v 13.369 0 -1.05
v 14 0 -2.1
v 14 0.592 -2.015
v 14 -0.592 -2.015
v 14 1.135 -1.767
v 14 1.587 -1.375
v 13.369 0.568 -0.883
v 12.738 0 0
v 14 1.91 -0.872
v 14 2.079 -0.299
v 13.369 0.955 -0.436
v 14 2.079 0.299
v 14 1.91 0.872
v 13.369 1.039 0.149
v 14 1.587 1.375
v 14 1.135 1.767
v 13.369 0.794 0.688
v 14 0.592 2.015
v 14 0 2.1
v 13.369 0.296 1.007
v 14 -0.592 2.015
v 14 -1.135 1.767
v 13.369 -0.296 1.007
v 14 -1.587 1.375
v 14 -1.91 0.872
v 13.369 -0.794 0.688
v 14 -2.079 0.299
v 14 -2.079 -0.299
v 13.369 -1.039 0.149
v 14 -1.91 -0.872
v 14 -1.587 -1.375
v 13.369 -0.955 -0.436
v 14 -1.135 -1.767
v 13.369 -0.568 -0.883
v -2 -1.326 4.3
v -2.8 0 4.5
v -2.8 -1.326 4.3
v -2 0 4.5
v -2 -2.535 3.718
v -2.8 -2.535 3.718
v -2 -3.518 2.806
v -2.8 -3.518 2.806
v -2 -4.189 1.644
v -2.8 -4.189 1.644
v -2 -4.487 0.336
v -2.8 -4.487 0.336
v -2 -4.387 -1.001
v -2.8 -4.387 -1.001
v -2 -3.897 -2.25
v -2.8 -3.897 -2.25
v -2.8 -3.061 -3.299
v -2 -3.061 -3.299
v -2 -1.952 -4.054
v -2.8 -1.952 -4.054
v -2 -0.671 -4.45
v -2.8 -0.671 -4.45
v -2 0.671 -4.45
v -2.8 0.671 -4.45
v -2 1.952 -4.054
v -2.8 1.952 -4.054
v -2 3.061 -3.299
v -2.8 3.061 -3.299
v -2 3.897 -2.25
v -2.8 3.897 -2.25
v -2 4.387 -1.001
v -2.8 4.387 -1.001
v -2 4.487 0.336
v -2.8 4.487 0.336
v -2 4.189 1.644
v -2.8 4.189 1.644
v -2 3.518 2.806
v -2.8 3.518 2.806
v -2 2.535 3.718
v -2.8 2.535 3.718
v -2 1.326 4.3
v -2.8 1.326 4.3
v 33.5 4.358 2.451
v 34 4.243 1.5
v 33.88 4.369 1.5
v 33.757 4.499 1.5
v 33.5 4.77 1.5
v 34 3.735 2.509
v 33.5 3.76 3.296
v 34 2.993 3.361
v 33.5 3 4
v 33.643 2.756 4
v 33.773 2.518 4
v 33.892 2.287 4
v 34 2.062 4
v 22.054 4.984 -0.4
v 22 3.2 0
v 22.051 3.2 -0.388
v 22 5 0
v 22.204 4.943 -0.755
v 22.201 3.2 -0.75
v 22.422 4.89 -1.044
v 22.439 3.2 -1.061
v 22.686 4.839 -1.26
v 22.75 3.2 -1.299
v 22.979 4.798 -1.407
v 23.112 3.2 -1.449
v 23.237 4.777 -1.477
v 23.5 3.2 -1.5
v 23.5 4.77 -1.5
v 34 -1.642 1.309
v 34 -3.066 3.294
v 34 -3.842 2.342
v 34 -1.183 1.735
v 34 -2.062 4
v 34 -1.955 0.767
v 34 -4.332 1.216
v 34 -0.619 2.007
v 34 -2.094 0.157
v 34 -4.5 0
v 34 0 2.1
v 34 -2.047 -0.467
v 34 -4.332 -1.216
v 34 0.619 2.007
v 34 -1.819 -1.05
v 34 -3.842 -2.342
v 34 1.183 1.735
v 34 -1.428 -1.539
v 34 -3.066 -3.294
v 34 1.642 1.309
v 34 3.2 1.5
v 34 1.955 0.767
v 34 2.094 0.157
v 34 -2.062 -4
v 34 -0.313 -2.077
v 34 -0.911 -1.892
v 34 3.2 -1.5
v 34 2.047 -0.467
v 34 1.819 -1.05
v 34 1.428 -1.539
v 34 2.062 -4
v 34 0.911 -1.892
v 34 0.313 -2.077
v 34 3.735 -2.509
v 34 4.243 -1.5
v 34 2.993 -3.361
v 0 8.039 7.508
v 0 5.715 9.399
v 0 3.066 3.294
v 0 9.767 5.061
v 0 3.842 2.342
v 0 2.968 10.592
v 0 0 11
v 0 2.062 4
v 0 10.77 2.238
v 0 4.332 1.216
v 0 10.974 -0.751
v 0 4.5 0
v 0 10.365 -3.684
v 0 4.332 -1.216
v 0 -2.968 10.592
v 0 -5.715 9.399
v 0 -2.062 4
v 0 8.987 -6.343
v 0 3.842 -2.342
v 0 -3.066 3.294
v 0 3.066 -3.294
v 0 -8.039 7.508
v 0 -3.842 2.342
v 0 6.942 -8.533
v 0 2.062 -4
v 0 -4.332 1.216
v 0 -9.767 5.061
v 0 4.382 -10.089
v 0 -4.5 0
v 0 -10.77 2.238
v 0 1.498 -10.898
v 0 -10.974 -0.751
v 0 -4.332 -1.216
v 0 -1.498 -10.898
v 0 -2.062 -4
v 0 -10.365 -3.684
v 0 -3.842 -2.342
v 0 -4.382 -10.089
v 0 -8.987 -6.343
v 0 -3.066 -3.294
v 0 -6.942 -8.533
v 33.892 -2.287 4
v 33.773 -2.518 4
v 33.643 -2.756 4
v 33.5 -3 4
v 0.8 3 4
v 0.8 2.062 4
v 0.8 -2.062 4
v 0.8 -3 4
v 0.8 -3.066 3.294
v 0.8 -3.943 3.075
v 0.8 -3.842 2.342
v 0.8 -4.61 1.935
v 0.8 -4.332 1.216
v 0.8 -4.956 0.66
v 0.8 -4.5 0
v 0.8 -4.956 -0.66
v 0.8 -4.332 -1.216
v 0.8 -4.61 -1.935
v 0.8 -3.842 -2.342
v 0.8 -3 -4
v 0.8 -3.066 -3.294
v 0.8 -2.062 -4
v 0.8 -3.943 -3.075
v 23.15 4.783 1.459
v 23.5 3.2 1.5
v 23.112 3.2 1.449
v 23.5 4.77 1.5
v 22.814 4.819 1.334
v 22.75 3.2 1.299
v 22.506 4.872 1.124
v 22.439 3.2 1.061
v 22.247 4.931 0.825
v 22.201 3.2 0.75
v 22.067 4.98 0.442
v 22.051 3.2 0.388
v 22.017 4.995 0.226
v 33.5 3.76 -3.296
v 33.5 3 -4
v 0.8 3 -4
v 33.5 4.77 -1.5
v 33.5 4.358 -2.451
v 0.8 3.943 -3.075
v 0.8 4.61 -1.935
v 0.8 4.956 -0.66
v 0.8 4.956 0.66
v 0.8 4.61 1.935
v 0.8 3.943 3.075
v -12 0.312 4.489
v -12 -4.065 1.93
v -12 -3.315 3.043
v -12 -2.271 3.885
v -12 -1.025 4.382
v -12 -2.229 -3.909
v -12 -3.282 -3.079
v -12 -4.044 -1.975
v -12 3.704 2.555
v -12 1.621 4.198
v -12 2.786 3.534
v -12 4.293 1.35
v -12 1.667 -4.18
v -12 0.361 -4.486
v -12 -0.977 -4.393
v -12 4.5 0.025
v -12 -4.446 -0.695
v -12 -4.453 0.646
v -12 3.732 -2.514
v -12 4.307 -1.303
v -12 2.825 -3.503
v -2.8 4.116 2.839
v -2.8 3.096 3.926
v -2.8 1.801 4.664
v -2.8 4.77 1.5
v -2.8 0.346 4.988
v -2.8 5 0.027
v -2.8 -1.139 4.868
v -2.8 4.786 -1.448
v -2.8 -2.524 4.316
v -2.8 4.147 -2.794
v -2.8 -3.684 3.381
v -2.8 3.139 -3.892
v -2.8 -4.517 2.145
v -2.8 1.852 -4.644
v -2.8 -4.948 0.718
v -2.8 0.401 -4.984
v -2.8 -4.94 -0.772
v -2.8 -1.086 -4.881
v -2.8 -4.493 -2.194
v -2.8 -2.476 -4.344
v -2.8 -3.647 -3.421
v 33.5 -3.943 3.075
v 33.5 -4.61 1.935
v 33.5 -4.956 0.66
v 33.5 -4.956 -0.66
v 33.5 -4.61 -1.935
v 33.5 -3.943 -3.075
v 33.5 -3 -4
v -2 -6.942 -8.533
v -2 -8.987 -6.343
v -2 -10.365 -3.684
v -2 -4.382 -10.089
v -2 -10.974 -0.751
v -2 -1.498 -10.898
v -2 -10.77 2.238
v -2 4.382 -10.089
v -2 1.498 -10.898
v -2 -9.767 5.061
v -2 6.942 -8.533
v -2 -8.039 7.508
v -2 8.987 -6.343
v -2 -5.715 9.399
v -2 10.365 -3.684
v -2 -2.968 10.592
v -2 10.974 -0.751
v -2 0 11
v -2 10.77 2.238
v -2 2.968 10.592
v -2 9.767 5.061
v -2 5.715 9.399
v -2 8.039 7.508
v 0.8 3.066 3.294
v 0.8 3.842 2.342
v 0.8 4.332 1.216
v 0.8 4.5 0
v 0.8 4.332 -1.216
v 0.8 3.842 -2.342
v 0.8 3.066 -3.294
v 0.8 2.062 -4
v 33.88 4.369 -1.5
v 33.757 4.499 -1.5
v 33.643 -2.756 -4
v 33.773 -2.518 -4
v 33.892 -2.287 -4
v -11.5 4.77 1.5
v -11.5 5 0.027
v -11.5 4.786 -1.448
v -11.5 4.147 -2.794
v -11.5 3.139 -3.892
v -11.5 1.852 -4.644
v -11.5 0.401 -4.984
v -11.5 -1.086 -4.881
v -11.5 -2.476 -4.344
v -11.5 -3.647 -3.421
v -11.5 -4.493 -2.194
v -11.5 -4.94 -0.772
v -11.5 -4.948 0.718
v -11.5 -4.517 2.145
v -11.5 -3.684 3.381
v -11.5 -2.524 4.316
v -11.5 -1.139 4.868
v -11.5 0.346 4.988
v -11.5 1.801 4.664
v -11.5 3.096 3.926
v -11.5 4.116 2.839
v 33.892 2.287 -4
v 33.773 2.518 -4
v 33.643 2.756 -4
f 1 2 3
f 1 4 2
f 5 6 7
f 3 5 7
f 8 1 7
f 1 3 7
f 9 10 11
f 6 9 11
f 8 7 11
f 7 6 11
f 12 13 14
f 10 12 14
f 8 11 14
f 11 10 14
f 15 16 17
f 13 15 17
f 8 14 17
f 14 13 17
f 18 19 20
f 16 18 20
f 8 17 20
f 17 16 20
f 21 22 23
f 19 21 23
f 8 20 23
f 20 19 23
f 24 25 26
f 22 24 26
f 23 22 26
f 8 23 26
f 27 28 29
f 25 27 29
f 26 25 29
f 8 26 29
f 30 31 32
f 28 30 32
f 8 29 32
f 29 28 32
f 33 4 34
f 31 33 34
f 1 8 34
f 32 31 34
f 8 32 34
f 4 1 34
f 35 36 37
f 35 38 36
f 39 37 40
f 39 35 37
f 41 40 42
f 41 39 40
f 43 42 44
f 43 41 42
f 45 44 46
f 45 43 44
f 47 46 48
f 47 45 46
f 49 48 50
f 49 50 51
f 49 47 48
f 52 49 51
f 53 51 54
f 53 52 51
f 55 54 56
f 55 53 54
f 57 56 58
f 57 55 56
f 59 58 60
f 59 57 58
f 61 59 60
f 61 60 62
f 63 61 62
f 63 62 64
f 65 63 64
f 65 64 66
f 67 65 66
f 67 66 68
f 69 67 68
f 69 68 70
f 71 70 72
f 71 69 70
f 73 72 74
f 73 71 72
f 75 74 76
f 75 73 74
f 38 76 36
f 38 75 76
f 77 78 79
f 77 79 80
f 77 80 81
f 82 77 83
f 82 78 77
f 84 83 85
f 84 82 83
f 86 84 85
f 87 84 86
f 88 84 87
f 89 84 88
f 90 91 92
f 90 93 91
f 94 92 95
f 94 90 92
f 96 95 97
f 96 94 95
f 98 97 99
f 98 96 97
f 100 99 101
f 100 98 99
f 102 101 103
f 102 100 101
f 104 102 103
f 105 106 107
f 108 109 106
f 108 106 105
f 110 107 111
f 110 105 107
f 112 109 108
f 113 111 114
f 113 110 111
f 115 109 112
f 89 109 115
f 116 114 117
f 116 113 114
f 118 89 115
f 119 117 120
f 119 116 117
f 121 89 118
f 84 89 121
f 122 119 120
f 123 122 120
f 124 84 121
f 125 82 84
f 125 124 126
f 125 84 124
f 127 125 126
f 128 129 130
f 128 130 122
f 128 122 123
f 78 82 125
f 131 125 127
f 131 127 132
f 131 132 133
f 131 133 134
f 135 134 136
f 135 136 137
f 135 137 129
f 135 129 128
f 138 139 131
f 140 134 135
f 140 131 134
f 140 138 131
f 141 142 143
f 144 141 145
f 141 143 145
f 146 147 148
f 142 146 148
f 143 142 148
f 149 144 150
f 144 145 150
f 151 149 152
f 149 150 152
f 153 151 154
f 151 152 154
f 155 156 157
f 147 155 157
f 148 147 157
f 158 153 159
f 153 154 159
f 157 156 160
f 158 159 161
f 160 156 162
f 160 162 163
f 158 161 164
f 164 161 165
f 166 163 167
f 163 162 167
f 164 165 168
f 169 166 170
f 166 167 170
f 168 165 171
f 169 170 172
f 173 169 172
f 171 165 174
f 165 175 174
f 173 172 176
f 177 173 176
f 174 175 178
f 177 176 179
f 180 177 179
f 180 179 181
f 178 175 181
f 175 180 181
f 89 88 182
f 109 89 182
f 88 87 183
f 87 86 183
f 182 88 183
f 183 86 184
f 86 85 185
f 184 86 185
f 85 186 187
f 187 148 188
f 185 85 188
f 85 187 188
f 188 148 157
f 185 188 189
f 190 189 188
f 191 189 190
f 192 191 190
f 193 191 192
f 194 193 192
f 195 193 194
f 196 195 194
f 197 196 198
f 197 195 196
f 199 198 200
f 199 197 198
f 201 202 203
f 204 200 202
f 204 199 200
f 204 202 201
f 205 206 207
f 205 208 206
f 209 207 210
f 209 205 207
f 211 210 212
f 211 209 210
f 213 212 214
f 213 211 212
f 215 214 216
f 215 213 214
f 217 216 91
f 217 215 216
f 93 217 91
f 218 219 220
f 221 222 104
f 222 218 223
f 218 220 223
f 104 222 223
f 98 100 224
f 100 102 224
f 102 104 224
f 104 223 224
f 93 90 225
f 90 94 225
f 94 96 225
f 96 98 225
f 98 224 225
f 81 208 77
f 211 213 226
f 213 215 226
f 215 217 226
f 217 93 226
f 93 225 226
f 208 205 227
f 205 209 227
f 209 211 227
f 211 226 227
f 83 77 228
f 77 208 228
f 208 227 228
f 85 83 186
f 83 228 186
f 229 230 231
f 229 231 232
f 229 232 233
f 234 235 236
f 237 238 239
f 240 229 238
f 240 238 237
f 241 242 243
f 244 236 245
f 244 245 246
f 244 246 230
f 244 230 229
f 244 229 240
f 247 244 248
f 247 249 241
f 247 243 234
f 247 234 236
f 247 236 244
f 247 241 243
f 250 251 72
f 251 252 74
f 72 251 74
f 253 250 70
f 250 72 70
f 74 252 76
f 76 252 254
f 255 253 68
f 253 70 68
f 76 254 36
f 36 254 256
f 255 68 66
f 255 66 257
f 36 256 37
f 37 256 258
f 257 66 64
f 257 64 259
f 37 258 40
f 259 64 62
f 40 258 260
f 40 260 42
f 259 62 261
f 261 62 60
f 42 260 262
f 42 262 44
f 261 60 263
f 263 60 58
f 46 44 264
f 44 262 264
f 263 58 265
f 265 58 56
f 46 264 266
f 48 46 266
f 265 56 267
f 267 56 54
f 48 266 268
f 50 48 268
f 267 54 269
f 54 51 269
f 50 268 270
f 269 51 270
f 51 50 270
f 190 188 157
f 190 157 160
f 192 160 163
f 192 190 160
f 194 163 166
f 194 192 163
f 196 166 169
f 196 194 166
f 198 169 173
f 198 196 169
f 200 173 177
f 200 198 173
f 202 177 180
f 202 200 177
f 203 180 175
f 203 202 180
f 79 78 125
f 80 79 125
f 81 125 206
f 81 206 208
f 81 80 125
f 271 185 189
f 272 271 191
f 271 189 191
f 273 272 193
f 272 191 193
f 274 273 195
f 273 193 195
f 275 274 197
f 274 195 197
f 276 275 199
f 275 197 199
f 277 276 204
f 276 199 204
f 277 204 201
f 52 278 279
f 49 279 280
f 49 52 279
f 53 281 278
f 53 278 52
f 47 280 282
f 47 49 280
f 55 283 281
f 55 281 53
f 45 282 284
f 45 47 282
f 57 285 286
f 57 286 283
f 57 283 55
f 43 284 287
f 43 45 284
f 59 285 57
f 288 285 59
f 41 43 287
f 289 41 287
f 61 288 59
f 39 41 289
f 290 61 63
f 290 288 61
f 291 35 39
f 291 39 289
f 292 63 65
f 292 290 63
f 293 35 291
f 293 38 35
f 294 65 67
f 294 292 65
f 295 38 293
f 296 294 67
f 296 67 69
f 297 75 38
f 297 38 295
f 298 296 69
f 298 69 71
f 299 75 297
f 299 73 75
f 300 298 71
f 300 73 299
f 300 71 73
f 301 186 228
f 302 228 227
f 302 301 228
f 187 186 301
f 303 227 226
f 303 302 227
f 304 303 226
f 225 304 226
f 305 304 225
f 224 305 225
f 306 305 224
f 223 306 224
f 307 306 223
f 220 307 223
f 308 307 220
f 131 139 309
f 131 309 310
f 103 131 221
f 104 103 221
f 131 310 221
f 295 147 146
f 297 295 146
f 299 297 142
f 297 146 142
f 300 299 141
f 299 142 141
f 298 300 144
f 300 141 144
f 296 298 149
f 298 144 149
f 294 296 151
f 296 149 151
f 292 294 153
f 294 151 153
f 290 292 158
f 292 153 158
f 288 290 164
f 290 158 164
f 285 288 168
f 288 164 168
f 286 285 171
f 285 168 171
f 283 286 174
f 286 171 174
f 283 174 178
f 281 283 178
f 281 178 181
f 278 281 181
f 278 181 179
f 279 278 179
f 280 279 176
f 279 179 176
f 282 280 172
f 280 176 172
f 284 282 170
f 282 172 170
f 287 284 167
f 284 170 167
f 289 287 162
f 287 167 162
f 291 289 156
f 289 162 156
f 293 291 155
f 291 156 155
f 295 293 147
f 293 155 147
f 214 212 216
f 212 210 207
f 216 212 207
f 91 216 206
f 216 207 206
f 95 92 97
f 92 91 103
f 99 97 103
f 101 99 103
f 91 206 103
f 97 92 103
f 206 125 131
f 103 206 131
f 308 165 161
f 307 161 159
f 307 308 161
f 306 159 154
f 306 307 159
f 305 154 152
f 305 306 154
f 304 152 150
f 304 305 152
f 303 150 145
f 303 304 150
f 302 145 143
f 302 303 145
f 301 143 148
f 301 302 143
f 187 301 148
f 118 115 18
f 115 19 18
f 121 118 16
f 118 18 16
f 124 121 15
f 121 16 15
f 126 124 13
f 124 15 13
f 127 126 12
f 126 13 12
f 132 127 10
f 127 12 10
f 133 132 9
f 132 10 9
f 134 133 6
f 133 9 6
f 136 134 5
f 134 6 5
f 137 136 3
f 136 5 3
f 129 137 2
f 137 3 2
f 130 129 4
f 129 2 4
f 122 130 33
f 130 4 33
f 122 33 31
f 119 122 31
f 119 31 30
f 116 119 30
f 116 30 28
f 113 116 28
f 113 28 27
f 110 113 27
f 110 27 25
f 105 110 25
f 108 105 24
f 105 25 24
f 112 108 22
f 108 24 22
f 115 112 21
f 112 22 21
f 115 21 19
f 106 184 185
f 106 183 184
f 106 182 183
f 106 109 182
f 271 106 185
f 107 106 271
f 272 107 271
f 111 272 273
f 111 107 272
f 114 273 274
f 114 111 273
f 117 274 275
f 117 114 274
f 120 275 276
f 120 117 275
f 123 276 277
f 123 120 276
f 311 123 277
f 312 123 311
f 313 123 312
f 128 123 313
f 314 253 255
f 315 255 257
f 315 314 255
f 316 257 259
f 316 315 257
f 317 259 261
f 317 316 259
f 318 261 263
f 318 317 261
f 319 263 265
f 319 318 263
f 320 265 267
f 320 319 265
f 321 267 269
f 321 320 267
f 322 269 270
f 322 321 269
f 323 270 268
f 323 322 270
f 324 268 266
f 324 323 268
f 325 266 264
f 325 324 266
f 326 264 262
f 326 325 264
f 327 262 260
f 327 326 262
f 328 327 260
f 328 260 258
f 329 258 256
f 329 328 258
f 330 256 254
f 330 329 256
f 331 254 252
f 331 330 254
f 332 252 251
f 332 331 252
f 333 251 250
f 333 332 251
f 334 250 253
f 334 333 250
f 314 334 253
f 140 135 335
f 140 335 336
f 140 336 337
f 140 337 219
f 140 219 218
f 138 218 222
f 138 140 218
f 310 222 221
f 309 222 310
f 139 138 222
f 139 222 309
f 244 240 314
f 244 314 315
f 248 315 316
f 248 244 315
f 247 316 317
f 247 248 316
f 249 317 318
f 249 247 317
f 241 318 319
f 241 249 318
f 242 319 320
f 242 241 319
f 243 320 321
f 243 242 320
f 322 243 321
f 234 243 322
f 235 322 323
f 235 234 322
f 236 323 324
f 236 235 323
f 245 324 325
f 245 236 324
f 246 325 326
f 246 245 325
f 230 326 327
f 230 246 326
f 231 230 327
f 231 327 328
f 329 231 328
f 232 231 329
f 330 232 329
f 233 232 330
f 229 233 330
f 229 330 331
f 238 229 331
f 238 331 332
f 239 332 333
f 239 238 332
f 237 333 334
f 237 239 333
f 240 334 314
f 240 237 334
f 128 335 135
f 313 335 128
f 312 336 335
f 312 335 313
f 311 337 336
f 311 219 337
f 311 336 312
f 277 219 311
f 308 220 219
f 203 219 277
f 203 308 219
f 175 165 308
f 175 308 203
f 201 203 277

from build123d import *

# Parameters (mm, degrees)
SKETCH1_R                        = 5
BOSS_EXTRUDE1_DEPTH              = 34
CHAMFER1_SIZE                    = 0.5
SKETCH2_R                        = 11
BOSS_EXTRUDE2_DEPTH              = 2
SKETCH3_W                        = 3
SKETCH3_H                        = 1.8
CUT_EXTRUDE1_DEPTH               = 12
FILLET1_R                        = 1.5
BOSS_EXTRUDE3_START              = 10
SKETCH4_R                        = 5
BOSS_EXTRUDE3_DEPTH              = 10
SKETCH6_W                        = 0.8
SKETCH6_H                        = 0.5
CHAMFER2_SIZE                    = 0.5
CUT_EXTRUDE2_DEPTH               = 38.389838192
TAP_DRILL_FOR_M4_HELICOIL1_D     = 4.2
TAP_DRILL_FOR_M4_HELICOIL1_DEPTH = 20
TAP_DRILL_FOR_M4_HELICOIL1_TIP   = 1.2618073


with BuildPart() as part:
    # Sketch1 → Boss-Extrude1 (new body)
    with BuildSketch(Plane(origin=(0, 0, 0), x_dir=(0, 0, -1), z_dir=(1, 0, 0))):
        Circle(SKETCH1_R)
    extrude(amount=BOSS_EXTRUDE1_DEPTH)

    # Chamfer1
    chamfer1_edges = [part.edges().sort_by_distance(p)[0] for p in [
        (34, 0, 5),
    ]]
    chamfer(chamfer1_edges, length=CHAMFER1_SIZE)

    # Sketch2 → Boss-Extrude2 (add)
    with BuildSketch(Plane.ZY):
        Circle(SKETCH2_R)
    extrude(amount=BOSS_EXTRUDE2_DEPTH)

    # Sketch3 → Cut-Extrude1 (cut)
    with BuildSketch(Plane(origin=(34, 0, 0), x_dir=(0, 0, -1), z_dir=(1, 0, 0))):
        with Locations((0, 4.1)):
            Rectangle(SKETCH3_W, SKETCH3_H)
    extrude(amount=-CUT_EXTRUDE1_DEPTH, mode=Mode.SUBTRACT)

    # Fillet1
    fillet1_edges = [part.edges().sort_by_distance(p)[0] for p in [
        (22, 3.984848004, 1.5),
        (22, 3.984848004, -1.5),
    ]]
    fillet(fillet1_edges, radius=FILLET1_R - 0.0001)  # a hair under: the kernel refuses the full size

    # Sketch4 → Boss-Extrude3 (add)
    with BuildSketch(Plane.ZY.offset(2).offset(BOSS_EXTRUDE3_START)):
        with Locations(Location((0, 0, 0), (0, 0, 72.542396876))):
            Circle(SKETCH4_R)
    extrude(amount=-BOSS_EXTRUDE3_DEPTH)

    # Sketch6 → Cut-Revolve1 (revolve, cut)
    with BuildSketch(Plane.XY, mode=Mode.PRIVATE) as cut_revolve1_sk:
        with Locations((-2.4, 4.75)):
            Rectangle(SKETCH6_W, SKETCH6_H)
        with Locations((0.4, 4.75)):
            Rectangle(SKETCH6_W, SKETCH6_H)
    revolve(cut_revolve1_sk.sketch.rotate(Axis((0, 0, 0), (1, 0, 0)), 90), axis=Axis((0, 0, 0), (1, 0, 0)), mode=Mode.SUBTRACT)

    # Chamfer2
    chamfer2_edges = [part.edges().sort_by_distance(p)[0] for p in [
        (-12, -4.769696007, -1.5),
    ]]
    chamfer(chamfer2_edges, length=CHAMFER2_SIZE)

    # Sketch7 → Cut-Extrude2 (cut, through all)
    with BuildSketch(Plane(origin=(0, 0, 0), x_dir=(0, 0, -1), z_dir=(1, 0, 0))):
        with BuildLine():
            Line((-4, 3), (-4, -3))
            ThreePointArc((-4, -3), (-5, 0), (-4, 3))
        make_face()
        with BuildLine():
            Line((4, 3), (4, -3))
            ThreePointArc((4, -3), (5, 0), (4, 3))
        make_face()
    extrude(amount=CUT_EXTRUDE2_DEPTH, mode=Mode.SUBTRACT)

    # Tap Drill for M4 Helicoil1
    with Locations(Plane(origin=(34, 0, 0), x_dir=(0, 0, -1), z_dir=(1, 0, 0))):
        with Locations((0, 0)):
            Hole(TAP_DRILL_FOR_M4_HELICOIL1_D / 2, depth=TAP_DRILL_FOR_M4_HELICOIL1_DEPTH)
            with Locations((0, 0, -(TAP_DRILL_FOR_M4_HELICOIL1_DEPTH + TAP_DRILL_FOR_M4_HELICOIL1_TIP / 2))):  # 118° drill point
                Cone(0, TAP_DRILL_FOR_M4_HELICOIL1_D / 2, TAP_DRILL_FOR_M4_HELICOIL1_TIP, mode=Mode.SUBTRACT)


solid = part.part
